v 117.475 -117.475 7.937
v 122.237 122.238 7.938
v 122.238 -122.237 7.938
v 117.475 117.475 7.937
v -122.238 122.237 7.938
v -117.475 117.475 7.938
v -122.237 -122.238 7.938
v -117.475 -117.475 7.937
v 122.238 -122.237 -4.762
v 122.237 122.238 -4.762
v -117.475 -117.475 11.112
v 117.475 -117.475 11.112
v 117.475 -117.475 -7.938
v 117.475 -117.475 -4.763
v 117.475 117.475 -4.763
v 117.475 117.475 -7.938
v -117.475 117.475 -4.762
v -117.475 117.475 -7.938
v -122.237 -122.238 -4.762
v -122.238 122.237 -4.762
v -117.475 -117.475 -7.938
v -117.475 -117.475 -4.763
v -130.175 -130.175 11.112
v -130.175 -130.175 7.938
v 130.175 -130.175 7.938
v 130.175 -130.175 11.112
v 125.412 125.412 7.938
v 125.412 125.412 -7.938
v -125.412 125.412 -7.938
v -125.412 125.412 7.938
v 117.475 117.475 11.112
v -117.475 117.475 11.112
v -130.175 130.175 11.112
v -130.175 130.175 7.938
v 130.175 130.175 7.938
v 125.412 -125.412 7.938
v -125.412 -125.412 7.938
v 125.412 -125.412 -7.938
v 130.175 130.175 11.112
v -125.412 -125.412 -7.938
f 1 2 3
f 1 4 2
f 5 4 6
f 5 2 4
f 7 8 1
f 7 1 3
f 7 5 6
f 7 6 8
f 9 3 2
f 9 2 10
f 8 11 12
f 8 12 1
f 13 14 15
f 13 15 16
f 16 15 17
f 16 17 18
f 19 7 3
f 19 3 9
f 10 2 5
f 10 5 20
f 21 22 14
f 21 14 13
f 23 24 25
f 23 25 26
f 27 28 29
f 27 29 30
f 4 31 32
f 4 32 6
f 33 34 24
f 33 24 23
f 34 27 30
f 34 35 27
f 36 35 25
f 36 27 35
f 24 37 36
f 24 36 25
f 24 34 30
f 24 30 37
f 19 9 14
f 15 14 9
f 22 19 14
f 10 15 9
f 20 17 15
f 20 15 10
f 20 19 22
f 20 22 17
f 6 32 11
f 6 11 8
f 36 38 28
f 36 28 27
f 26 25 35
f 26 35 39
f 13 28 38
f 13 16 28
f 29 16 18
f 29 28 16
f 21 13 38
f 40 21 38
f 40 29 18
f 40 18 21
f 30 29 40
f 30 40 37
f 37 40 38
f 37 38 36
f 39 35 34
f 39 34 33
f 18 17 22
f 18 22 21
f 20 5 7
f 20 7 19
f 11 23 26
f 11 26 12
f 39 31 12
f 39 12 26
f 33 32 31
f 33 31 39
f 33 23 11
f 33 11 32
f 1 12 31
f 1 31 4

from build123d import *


with BuildPart() as part:
    # Sweep1: sweep along a path in Sketch2
    with BuildLine(Plane.XY) as sweep1_path:
        Line((125.4125, -125.4125), (-125.4125, -125.4125))
        Line((-125.4125, -125.4125), (-125.4125, 125.4125))
        Line((-125.4125, 125.4125), (125.4125, 125.4125))
        Line((125.4125, 125.4125), (125.4125, -125.4125))
    # Sketch1 → Sweep1 (sweep)
    with BuildSketch(Plane(origin=(0, 0, 0), x_dir=(1, 0, 0), z_dir=(0, 1, 0))):
        Polygon((-125.4125, 7.9375), (-125.4125, -7.9375), (-130.175, -7.9375), (-130.175, -11.1125), (-117.475, -11.1125), (-117.475, -7.9375), (-122.2375, -7.9375), (-122.2375, 4.7625), (-117.475, 4.7625), (-117.475, 7.9375), align=None)
    sweep(path=sweep1_path.line, transition=Transition.RIGHT)


solid = part.part
